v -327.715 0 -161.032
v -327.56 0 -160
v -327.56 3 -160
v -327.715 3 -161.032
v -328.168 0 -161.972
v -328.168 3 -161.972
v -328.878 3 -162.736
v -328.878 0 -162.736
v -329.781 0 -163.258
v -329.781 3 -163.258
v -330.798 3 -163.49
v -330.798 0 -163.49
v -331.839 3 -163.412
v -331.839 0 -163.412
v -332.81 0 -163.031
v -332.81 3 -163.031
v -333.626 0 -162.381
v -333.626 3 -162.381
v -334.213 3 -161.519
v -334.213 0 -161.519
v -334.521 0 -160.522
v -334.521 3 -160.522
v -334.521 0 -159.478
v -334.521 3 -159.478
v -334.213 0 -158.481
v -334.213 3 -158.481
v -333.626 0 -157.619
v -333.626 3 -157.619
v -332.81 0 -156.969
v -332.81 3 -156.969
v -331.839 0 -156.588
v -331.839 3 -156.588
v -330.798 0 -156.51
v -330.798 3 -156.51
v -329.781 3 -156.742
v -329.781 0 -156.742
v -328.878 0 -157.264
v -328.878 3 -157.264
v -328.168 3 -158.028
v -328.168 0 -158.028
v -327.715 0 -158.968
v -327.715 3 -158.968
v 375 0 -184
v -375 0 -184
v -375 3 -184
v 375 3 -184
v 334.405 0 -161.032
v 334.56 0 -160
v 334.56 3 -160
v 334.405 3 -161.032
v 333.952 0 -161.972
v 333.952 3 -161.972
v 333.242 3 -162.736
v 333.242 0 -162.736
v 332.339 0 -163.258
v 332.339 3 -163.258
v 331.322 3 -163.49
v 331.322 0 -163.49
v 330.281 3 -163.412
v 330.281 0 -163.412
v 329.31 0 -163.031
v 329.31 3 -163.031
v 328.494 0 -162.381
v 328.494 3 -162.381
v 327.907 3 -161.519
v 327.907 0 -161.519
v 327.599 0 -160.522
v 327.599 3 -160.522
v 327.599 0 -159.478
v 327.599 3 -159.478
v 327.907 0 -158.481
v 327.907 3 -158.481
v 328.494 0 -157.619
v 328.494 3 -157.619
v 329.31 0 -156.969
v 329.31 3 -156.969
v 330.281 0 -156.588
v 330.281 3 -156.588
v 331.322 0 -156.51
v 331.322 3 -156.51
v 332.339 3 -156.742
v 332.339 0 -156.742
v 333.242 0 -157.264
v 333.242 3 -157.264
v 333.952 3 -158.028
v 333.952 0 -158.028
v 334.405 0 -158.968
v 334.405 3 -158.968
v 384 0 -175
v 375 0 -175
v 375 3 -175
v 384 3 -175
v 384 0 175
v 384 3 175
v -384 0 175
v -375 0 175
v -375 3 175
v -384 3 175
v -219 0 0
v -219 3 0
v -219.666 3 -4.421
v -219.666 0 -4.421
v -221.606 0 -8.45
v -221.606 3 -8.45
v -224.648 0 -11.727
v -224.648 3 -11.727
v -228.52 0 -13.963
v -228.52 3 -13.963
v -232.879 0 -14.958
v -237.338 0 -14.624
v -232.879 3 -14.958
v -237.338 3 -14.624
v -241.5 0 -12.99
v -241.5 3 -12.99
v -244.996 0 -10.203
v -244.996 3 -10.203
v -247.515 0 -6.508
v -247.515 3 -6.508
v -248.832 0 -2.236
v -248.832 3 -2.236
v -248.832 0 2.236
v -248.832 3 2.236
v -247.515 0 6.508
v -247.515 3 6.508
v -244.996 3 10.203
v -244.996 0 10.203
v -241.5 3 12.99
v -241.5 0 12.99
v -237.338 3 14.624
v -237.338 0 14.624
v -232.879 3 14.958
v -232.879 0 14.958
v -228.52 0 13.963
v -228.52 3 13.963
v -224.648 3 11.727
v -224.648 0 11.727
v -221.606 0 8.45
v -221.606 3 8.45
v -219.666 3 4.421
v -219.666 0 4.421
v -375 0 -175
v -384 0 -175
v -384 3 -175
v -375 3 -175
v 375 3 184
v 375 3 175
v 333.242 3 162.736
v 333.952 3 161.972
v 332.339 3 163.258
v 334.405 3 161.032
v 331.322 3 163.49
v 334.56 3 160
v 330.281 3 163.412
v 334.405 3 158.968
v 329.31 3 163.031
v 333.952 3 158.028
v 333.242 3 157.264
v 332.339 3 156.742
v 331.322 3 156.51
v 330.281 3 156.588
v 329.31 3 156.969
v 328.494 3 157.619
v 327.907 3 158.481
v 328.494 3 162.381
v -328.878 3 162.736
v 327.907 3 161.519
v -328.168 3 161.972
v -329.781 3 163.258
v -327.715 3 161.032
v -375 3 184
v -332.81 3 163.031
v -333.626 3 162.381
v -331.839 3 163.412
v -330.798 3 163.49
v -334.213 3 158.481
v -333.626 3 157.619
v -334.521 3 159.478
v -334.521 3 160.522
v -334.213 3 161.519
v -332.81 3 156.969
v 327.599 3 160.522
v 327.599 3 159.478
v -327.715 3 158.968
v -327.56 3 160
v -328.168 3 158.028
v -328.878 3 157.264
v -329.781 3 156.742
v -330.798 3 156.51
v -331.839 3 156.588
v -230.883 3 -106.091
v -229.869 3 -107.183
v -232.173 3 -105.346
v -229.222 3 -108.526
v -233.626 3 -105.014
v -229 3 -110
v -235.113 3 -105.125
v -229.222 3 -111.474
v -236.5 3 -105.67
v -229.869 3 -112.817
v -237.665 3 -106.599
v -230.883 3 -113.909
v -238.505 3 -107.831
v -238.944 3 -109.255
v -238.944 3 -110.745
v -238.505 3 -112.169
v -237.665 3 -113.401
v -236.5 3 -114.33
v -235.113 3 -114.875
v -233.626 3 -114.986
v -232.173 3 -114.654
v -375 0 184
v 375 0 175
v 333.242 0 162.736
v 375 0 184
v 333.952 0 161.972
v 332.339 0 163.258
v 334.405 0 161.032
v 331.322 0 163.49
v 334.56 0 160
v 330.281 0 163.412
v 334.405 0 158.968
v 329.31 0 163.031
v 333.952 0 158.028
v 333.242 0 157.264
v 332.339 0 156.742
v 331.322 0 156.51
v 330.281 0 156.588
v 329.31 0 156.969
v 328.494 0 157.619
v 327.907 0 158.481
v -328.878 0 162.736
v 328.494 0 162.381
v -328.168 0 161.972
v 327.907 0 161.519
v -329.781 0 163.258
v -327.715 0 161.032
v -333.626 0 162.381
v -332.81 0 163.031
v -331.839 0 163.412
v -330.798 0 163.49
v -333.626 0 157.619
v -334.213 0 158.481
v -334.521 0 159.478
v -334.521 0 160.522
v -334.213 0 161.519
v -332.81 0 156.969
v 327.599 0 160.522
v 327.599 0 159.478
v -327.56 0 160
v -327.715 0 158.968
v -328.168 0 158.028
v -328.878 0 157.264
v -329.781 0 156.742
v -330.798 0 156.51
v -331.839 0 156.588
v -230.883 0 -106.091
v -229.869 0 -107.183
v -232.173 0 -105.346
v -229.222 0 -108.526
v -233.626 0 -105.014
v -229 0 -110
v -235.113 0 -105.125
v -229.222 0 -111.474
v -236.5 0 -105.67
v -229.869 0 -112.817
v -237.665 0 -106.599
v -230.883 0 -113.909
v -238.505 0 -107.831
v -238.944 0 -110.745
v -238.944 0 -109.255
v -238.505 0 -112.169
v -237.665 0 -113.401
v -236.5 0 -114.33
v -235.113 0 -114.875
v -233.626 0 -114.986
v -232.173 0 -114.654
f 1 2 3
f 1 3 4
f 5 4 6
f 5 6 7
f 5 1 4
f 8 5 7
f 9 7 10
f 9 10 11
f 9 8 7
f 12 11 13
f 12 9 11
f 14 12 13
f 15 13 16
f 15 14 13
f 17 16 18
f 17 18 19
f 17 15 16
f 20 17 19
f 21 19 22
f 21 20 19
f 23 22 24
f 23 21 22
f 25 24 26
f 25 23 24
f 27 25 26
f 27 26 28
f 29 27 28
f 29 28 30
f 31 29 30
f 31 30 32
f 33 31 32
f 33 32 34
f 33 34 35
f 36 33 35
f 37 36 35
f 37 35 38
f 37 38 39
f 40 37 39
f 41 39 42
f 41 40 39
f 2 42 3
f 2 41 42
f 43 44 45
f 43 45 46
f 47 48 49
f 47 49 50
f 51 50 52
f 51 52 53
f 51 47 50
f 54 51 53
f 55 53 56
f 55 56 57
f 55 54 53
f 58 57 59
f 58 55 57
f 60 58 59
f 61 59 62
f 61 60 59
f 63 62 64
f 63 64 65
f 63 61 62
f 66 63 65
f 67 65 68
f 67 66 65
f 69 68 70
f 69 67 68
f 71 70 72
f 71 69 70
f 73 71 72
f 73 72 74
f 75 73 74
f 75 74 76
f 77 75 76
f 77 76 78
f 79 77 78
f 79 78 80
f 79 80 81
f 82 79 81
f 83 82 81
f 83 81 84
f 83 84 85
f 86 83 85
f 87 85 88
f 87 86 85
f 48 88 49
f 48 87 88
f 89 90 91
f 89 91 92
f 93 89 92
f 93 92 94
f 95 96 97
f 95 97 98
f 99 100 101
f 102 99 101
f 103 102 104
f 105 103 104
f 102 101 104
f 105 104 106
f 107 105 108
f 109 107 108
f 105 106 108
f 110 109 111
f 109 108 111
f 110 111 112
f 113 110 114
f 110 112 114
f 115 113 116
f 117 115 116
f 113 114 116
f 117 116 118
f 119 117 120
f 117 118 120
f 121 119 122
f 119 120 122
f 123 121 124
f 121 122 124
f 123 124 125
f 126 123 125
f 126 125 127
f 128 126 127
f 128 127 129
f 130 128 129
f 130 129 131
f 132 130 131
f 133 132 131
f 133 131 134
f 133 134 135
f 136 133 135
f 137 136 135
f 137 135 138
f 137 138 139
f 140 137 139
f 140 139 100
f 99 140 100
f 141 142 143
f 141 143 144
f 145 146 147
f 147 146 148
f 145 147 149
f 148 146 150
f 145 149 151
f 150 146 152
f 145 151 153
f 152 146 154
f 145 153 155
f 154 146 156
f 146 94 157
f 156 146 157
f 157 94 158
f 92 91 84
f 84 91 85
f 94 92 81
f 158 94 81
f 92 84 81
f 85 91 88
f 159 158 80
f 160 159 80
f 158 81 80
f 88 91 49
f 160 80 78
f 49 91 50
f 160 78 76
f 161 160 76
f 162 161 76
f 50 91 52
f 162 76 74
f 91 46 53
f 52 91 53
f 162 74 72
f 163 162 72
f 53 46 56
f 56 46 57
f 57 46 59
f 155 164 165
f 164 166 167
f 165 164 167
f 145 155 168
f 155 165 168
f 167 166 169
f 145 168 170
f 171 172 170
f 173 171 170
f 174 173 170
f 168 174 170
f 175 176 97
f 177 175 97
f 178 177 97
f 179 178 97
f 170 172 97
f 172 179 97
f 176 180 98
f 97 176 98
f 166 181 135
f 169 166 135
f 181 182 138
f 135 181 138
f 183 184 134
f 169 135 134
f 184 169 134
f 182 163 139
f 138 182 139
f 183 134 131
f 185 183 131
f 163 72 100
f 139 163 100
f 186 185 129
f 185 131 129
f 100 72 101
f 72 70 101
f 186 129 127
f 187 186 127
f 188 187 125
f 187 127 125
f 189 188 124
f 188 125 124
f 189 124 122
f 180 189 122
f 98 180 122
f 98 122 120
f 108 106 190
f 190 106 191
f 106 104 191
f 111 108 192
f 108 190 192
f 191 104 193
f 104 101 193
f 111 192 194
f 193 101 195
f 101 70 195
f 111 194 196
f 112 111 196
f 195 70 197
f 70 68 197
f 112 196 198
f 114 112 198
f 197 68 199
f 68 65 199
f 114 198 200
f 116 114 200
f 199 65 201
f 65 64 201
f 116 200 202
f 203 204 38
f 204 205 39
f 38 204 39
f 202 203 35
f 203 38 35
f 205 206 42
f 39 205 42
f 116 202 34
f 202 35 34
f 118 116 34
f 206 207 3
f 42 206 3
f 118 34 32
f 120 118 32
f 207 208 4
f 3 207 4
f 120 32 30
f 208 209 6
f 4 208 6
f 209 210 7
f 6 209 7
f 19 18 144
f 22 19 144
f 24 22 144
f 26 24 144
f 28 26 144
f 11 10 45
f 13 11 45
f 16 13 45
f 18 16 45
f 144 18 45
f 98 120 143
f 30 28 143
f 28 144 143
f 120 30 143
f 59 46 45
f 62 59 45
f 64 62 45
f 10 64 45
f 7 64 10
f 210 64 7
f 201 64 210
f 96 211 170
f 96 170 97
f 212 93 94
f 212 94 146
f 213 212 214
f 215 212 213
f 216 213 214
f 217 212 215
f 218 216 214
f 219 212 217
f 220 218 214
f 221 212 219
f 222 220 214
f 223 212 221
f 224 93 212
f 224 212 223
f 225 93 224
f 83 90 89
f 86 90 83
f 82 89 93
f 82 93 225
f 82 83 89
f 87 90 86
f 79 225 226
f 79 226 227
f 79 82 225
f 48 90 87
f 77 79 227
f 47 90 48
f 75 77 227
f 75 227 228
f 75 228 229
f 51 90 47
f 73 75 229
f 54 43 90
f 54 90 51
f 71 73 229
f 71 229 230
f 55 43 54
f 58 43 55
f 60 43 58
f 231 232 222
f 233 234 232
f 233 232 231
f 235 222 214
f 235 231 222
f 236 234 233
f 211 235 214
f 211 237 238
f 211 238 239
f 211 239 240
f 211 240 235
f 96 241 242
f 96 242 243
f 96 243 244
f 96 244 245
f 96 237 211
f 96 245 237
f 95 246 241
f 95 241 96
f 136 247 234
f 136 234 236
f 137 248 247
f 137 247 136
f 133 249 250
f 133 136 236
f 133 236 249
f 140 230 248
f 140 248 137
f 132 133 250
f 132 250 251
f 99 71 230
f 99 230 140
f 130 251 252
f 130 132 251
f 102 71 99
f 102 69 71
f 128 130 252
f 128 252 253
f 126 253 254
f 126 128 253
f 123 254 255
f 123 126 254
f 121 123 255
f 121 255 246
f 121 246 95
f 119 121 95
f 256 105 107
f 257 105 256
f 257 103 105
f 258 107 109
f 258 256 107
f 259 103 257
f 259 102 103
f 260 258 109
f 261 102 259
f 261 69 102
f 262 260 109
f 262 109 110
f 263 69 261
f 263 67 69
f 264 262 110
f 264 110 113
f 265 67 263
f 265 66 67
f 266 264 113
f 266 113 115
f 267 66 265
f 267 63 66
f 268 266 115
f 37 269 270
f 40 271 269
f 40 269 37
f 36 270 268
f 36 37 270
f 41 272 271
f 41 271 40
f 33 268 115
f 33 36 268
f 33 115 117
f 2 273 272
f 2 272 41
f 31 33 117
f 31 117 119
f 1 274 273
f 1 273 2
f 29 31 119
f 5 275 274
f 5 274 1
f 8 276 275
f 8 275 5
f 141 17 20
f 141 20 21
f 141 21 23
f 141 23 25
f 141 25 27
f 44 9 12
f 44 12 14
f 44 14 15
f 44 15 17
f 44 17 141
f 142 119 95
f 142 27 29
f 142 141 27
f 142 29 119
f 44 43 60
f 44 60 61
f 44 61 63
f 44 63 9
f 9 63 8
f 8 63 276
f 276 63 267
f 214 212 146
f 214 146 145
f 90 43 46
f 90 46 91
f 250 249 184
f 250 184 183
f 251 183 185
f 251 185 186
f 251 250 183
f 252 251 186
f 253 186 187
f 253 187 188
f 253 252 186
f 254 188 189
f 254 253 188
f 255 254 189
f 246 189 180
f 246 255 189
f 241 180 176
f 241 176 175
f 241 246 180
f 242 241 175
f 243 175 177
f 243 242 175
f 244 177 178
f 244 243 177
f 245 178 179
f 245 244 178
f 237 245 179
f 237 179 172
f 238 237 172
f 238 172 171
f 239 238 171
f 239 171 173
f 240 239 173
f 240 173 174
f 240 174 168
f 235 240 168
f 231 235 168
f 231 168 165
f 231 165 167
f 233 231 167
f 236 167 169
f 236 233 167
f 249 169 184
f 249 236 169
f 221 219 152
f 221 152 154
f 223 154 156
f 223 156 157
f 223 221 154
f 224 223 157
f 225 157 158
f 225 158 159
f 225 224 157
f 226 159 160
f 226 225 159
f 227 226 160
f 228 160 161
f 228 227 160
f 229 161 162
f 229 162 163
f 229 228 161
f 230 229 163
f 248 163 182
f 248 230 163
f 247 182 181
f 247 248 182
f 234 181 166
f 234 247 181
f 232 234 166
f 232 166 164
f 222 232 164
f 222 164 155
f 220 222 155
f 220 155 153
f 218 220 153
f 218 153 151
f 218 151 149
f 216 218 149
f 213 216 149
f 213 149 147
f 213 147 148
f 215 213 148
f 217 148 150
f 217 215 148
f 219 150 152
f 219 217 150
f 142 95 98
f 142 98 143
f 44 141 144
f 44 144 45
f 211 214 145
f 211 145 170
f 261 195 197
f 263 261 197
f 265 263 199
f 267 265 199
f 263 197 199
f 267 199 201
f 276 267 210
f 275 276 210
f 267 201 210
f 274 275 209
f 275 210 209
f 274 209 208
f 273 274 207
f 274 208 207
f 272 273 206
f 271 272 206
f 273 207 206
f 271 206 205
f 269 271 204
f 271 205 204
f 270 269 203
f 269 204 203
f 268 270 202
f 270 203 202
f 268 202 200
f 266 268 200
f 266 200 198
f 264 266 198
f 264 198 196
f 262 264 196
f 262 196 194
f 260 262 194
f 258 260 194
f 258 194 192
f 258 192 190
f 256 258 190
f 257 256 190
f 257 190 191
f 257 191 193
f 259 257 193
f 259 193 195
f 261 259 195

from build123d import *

# Parameters (mm, degrees)
SKETCH2_R           = 3.5
BOSS_EXTRUDE1_DEPTH = 3
SKETCH3_R           = 15
CUT_EXTRUDE1_DEPTH  = 4
SKETCH4_R           = 5
CUT_EXTRUDE2_DEPTH  = 4


with BuildPart() as part:
    # Sketch2 → Boss-Extrude1 (new body)
    with BuildSketch(Plane(origin=(0, 0, 0), x_dir=(1, 0, 0), z_dir=(0, 1, 0))):
        Polygon((-375, 184), (375, 184), (375, 175), (384, 175), (384, -175), (375, -175), (375, -184), (-375, -184), (-375, -175), (-384, -175), (-384, 175), (-375, 175), align=None)
        with Locations((-331.06, 160)):
            Circle(SKETCH2_R, mode=Mode.SUBTRACT)
        with Locations((-331.06, -160)):
            Circle(SKETCH2_R, mode=Mode.SUBTRACT)
        with Locations((331.06, 160)):
            Circle(SKETCH2_R, mode=Mode.SUBTRACT)
        with Locations((331.06, -160)):
            Circle(SKETCH2_R, mode=Mode.SUBTRACT)
    extrude(amount=BOSS_EXTRUDE1_DEPTH)

    # Sketch3 → Cut-Extrude1 (cut, through all)
    with BuildSketch(Plane(origin=(0, 3, 0), x_dir=(1, 0, 0), z_dir=(0, 1, 0))):
        with Locations((-234, 0)):
            Circle(SKETCH3_R)
    extrude(amount=-CUT_EXTRUDE1_DEPTH, mode=Mode.SUBTRACT)

    # Sketch4 → Cut-Extrude2 (cut, through all)
    with BuildSketch(Plane(origin=(0, 3, 0), x_dir=(1, 0, 0), z_dir=(0, 1, 0))):
        with Locations((-234, 110)):
            Circle(SKETCH4_R)
    extrude(amount=-CUT_EXTRUDE2_DEPTH, mode=Mode.SUBTRACT)


solid = part.part
